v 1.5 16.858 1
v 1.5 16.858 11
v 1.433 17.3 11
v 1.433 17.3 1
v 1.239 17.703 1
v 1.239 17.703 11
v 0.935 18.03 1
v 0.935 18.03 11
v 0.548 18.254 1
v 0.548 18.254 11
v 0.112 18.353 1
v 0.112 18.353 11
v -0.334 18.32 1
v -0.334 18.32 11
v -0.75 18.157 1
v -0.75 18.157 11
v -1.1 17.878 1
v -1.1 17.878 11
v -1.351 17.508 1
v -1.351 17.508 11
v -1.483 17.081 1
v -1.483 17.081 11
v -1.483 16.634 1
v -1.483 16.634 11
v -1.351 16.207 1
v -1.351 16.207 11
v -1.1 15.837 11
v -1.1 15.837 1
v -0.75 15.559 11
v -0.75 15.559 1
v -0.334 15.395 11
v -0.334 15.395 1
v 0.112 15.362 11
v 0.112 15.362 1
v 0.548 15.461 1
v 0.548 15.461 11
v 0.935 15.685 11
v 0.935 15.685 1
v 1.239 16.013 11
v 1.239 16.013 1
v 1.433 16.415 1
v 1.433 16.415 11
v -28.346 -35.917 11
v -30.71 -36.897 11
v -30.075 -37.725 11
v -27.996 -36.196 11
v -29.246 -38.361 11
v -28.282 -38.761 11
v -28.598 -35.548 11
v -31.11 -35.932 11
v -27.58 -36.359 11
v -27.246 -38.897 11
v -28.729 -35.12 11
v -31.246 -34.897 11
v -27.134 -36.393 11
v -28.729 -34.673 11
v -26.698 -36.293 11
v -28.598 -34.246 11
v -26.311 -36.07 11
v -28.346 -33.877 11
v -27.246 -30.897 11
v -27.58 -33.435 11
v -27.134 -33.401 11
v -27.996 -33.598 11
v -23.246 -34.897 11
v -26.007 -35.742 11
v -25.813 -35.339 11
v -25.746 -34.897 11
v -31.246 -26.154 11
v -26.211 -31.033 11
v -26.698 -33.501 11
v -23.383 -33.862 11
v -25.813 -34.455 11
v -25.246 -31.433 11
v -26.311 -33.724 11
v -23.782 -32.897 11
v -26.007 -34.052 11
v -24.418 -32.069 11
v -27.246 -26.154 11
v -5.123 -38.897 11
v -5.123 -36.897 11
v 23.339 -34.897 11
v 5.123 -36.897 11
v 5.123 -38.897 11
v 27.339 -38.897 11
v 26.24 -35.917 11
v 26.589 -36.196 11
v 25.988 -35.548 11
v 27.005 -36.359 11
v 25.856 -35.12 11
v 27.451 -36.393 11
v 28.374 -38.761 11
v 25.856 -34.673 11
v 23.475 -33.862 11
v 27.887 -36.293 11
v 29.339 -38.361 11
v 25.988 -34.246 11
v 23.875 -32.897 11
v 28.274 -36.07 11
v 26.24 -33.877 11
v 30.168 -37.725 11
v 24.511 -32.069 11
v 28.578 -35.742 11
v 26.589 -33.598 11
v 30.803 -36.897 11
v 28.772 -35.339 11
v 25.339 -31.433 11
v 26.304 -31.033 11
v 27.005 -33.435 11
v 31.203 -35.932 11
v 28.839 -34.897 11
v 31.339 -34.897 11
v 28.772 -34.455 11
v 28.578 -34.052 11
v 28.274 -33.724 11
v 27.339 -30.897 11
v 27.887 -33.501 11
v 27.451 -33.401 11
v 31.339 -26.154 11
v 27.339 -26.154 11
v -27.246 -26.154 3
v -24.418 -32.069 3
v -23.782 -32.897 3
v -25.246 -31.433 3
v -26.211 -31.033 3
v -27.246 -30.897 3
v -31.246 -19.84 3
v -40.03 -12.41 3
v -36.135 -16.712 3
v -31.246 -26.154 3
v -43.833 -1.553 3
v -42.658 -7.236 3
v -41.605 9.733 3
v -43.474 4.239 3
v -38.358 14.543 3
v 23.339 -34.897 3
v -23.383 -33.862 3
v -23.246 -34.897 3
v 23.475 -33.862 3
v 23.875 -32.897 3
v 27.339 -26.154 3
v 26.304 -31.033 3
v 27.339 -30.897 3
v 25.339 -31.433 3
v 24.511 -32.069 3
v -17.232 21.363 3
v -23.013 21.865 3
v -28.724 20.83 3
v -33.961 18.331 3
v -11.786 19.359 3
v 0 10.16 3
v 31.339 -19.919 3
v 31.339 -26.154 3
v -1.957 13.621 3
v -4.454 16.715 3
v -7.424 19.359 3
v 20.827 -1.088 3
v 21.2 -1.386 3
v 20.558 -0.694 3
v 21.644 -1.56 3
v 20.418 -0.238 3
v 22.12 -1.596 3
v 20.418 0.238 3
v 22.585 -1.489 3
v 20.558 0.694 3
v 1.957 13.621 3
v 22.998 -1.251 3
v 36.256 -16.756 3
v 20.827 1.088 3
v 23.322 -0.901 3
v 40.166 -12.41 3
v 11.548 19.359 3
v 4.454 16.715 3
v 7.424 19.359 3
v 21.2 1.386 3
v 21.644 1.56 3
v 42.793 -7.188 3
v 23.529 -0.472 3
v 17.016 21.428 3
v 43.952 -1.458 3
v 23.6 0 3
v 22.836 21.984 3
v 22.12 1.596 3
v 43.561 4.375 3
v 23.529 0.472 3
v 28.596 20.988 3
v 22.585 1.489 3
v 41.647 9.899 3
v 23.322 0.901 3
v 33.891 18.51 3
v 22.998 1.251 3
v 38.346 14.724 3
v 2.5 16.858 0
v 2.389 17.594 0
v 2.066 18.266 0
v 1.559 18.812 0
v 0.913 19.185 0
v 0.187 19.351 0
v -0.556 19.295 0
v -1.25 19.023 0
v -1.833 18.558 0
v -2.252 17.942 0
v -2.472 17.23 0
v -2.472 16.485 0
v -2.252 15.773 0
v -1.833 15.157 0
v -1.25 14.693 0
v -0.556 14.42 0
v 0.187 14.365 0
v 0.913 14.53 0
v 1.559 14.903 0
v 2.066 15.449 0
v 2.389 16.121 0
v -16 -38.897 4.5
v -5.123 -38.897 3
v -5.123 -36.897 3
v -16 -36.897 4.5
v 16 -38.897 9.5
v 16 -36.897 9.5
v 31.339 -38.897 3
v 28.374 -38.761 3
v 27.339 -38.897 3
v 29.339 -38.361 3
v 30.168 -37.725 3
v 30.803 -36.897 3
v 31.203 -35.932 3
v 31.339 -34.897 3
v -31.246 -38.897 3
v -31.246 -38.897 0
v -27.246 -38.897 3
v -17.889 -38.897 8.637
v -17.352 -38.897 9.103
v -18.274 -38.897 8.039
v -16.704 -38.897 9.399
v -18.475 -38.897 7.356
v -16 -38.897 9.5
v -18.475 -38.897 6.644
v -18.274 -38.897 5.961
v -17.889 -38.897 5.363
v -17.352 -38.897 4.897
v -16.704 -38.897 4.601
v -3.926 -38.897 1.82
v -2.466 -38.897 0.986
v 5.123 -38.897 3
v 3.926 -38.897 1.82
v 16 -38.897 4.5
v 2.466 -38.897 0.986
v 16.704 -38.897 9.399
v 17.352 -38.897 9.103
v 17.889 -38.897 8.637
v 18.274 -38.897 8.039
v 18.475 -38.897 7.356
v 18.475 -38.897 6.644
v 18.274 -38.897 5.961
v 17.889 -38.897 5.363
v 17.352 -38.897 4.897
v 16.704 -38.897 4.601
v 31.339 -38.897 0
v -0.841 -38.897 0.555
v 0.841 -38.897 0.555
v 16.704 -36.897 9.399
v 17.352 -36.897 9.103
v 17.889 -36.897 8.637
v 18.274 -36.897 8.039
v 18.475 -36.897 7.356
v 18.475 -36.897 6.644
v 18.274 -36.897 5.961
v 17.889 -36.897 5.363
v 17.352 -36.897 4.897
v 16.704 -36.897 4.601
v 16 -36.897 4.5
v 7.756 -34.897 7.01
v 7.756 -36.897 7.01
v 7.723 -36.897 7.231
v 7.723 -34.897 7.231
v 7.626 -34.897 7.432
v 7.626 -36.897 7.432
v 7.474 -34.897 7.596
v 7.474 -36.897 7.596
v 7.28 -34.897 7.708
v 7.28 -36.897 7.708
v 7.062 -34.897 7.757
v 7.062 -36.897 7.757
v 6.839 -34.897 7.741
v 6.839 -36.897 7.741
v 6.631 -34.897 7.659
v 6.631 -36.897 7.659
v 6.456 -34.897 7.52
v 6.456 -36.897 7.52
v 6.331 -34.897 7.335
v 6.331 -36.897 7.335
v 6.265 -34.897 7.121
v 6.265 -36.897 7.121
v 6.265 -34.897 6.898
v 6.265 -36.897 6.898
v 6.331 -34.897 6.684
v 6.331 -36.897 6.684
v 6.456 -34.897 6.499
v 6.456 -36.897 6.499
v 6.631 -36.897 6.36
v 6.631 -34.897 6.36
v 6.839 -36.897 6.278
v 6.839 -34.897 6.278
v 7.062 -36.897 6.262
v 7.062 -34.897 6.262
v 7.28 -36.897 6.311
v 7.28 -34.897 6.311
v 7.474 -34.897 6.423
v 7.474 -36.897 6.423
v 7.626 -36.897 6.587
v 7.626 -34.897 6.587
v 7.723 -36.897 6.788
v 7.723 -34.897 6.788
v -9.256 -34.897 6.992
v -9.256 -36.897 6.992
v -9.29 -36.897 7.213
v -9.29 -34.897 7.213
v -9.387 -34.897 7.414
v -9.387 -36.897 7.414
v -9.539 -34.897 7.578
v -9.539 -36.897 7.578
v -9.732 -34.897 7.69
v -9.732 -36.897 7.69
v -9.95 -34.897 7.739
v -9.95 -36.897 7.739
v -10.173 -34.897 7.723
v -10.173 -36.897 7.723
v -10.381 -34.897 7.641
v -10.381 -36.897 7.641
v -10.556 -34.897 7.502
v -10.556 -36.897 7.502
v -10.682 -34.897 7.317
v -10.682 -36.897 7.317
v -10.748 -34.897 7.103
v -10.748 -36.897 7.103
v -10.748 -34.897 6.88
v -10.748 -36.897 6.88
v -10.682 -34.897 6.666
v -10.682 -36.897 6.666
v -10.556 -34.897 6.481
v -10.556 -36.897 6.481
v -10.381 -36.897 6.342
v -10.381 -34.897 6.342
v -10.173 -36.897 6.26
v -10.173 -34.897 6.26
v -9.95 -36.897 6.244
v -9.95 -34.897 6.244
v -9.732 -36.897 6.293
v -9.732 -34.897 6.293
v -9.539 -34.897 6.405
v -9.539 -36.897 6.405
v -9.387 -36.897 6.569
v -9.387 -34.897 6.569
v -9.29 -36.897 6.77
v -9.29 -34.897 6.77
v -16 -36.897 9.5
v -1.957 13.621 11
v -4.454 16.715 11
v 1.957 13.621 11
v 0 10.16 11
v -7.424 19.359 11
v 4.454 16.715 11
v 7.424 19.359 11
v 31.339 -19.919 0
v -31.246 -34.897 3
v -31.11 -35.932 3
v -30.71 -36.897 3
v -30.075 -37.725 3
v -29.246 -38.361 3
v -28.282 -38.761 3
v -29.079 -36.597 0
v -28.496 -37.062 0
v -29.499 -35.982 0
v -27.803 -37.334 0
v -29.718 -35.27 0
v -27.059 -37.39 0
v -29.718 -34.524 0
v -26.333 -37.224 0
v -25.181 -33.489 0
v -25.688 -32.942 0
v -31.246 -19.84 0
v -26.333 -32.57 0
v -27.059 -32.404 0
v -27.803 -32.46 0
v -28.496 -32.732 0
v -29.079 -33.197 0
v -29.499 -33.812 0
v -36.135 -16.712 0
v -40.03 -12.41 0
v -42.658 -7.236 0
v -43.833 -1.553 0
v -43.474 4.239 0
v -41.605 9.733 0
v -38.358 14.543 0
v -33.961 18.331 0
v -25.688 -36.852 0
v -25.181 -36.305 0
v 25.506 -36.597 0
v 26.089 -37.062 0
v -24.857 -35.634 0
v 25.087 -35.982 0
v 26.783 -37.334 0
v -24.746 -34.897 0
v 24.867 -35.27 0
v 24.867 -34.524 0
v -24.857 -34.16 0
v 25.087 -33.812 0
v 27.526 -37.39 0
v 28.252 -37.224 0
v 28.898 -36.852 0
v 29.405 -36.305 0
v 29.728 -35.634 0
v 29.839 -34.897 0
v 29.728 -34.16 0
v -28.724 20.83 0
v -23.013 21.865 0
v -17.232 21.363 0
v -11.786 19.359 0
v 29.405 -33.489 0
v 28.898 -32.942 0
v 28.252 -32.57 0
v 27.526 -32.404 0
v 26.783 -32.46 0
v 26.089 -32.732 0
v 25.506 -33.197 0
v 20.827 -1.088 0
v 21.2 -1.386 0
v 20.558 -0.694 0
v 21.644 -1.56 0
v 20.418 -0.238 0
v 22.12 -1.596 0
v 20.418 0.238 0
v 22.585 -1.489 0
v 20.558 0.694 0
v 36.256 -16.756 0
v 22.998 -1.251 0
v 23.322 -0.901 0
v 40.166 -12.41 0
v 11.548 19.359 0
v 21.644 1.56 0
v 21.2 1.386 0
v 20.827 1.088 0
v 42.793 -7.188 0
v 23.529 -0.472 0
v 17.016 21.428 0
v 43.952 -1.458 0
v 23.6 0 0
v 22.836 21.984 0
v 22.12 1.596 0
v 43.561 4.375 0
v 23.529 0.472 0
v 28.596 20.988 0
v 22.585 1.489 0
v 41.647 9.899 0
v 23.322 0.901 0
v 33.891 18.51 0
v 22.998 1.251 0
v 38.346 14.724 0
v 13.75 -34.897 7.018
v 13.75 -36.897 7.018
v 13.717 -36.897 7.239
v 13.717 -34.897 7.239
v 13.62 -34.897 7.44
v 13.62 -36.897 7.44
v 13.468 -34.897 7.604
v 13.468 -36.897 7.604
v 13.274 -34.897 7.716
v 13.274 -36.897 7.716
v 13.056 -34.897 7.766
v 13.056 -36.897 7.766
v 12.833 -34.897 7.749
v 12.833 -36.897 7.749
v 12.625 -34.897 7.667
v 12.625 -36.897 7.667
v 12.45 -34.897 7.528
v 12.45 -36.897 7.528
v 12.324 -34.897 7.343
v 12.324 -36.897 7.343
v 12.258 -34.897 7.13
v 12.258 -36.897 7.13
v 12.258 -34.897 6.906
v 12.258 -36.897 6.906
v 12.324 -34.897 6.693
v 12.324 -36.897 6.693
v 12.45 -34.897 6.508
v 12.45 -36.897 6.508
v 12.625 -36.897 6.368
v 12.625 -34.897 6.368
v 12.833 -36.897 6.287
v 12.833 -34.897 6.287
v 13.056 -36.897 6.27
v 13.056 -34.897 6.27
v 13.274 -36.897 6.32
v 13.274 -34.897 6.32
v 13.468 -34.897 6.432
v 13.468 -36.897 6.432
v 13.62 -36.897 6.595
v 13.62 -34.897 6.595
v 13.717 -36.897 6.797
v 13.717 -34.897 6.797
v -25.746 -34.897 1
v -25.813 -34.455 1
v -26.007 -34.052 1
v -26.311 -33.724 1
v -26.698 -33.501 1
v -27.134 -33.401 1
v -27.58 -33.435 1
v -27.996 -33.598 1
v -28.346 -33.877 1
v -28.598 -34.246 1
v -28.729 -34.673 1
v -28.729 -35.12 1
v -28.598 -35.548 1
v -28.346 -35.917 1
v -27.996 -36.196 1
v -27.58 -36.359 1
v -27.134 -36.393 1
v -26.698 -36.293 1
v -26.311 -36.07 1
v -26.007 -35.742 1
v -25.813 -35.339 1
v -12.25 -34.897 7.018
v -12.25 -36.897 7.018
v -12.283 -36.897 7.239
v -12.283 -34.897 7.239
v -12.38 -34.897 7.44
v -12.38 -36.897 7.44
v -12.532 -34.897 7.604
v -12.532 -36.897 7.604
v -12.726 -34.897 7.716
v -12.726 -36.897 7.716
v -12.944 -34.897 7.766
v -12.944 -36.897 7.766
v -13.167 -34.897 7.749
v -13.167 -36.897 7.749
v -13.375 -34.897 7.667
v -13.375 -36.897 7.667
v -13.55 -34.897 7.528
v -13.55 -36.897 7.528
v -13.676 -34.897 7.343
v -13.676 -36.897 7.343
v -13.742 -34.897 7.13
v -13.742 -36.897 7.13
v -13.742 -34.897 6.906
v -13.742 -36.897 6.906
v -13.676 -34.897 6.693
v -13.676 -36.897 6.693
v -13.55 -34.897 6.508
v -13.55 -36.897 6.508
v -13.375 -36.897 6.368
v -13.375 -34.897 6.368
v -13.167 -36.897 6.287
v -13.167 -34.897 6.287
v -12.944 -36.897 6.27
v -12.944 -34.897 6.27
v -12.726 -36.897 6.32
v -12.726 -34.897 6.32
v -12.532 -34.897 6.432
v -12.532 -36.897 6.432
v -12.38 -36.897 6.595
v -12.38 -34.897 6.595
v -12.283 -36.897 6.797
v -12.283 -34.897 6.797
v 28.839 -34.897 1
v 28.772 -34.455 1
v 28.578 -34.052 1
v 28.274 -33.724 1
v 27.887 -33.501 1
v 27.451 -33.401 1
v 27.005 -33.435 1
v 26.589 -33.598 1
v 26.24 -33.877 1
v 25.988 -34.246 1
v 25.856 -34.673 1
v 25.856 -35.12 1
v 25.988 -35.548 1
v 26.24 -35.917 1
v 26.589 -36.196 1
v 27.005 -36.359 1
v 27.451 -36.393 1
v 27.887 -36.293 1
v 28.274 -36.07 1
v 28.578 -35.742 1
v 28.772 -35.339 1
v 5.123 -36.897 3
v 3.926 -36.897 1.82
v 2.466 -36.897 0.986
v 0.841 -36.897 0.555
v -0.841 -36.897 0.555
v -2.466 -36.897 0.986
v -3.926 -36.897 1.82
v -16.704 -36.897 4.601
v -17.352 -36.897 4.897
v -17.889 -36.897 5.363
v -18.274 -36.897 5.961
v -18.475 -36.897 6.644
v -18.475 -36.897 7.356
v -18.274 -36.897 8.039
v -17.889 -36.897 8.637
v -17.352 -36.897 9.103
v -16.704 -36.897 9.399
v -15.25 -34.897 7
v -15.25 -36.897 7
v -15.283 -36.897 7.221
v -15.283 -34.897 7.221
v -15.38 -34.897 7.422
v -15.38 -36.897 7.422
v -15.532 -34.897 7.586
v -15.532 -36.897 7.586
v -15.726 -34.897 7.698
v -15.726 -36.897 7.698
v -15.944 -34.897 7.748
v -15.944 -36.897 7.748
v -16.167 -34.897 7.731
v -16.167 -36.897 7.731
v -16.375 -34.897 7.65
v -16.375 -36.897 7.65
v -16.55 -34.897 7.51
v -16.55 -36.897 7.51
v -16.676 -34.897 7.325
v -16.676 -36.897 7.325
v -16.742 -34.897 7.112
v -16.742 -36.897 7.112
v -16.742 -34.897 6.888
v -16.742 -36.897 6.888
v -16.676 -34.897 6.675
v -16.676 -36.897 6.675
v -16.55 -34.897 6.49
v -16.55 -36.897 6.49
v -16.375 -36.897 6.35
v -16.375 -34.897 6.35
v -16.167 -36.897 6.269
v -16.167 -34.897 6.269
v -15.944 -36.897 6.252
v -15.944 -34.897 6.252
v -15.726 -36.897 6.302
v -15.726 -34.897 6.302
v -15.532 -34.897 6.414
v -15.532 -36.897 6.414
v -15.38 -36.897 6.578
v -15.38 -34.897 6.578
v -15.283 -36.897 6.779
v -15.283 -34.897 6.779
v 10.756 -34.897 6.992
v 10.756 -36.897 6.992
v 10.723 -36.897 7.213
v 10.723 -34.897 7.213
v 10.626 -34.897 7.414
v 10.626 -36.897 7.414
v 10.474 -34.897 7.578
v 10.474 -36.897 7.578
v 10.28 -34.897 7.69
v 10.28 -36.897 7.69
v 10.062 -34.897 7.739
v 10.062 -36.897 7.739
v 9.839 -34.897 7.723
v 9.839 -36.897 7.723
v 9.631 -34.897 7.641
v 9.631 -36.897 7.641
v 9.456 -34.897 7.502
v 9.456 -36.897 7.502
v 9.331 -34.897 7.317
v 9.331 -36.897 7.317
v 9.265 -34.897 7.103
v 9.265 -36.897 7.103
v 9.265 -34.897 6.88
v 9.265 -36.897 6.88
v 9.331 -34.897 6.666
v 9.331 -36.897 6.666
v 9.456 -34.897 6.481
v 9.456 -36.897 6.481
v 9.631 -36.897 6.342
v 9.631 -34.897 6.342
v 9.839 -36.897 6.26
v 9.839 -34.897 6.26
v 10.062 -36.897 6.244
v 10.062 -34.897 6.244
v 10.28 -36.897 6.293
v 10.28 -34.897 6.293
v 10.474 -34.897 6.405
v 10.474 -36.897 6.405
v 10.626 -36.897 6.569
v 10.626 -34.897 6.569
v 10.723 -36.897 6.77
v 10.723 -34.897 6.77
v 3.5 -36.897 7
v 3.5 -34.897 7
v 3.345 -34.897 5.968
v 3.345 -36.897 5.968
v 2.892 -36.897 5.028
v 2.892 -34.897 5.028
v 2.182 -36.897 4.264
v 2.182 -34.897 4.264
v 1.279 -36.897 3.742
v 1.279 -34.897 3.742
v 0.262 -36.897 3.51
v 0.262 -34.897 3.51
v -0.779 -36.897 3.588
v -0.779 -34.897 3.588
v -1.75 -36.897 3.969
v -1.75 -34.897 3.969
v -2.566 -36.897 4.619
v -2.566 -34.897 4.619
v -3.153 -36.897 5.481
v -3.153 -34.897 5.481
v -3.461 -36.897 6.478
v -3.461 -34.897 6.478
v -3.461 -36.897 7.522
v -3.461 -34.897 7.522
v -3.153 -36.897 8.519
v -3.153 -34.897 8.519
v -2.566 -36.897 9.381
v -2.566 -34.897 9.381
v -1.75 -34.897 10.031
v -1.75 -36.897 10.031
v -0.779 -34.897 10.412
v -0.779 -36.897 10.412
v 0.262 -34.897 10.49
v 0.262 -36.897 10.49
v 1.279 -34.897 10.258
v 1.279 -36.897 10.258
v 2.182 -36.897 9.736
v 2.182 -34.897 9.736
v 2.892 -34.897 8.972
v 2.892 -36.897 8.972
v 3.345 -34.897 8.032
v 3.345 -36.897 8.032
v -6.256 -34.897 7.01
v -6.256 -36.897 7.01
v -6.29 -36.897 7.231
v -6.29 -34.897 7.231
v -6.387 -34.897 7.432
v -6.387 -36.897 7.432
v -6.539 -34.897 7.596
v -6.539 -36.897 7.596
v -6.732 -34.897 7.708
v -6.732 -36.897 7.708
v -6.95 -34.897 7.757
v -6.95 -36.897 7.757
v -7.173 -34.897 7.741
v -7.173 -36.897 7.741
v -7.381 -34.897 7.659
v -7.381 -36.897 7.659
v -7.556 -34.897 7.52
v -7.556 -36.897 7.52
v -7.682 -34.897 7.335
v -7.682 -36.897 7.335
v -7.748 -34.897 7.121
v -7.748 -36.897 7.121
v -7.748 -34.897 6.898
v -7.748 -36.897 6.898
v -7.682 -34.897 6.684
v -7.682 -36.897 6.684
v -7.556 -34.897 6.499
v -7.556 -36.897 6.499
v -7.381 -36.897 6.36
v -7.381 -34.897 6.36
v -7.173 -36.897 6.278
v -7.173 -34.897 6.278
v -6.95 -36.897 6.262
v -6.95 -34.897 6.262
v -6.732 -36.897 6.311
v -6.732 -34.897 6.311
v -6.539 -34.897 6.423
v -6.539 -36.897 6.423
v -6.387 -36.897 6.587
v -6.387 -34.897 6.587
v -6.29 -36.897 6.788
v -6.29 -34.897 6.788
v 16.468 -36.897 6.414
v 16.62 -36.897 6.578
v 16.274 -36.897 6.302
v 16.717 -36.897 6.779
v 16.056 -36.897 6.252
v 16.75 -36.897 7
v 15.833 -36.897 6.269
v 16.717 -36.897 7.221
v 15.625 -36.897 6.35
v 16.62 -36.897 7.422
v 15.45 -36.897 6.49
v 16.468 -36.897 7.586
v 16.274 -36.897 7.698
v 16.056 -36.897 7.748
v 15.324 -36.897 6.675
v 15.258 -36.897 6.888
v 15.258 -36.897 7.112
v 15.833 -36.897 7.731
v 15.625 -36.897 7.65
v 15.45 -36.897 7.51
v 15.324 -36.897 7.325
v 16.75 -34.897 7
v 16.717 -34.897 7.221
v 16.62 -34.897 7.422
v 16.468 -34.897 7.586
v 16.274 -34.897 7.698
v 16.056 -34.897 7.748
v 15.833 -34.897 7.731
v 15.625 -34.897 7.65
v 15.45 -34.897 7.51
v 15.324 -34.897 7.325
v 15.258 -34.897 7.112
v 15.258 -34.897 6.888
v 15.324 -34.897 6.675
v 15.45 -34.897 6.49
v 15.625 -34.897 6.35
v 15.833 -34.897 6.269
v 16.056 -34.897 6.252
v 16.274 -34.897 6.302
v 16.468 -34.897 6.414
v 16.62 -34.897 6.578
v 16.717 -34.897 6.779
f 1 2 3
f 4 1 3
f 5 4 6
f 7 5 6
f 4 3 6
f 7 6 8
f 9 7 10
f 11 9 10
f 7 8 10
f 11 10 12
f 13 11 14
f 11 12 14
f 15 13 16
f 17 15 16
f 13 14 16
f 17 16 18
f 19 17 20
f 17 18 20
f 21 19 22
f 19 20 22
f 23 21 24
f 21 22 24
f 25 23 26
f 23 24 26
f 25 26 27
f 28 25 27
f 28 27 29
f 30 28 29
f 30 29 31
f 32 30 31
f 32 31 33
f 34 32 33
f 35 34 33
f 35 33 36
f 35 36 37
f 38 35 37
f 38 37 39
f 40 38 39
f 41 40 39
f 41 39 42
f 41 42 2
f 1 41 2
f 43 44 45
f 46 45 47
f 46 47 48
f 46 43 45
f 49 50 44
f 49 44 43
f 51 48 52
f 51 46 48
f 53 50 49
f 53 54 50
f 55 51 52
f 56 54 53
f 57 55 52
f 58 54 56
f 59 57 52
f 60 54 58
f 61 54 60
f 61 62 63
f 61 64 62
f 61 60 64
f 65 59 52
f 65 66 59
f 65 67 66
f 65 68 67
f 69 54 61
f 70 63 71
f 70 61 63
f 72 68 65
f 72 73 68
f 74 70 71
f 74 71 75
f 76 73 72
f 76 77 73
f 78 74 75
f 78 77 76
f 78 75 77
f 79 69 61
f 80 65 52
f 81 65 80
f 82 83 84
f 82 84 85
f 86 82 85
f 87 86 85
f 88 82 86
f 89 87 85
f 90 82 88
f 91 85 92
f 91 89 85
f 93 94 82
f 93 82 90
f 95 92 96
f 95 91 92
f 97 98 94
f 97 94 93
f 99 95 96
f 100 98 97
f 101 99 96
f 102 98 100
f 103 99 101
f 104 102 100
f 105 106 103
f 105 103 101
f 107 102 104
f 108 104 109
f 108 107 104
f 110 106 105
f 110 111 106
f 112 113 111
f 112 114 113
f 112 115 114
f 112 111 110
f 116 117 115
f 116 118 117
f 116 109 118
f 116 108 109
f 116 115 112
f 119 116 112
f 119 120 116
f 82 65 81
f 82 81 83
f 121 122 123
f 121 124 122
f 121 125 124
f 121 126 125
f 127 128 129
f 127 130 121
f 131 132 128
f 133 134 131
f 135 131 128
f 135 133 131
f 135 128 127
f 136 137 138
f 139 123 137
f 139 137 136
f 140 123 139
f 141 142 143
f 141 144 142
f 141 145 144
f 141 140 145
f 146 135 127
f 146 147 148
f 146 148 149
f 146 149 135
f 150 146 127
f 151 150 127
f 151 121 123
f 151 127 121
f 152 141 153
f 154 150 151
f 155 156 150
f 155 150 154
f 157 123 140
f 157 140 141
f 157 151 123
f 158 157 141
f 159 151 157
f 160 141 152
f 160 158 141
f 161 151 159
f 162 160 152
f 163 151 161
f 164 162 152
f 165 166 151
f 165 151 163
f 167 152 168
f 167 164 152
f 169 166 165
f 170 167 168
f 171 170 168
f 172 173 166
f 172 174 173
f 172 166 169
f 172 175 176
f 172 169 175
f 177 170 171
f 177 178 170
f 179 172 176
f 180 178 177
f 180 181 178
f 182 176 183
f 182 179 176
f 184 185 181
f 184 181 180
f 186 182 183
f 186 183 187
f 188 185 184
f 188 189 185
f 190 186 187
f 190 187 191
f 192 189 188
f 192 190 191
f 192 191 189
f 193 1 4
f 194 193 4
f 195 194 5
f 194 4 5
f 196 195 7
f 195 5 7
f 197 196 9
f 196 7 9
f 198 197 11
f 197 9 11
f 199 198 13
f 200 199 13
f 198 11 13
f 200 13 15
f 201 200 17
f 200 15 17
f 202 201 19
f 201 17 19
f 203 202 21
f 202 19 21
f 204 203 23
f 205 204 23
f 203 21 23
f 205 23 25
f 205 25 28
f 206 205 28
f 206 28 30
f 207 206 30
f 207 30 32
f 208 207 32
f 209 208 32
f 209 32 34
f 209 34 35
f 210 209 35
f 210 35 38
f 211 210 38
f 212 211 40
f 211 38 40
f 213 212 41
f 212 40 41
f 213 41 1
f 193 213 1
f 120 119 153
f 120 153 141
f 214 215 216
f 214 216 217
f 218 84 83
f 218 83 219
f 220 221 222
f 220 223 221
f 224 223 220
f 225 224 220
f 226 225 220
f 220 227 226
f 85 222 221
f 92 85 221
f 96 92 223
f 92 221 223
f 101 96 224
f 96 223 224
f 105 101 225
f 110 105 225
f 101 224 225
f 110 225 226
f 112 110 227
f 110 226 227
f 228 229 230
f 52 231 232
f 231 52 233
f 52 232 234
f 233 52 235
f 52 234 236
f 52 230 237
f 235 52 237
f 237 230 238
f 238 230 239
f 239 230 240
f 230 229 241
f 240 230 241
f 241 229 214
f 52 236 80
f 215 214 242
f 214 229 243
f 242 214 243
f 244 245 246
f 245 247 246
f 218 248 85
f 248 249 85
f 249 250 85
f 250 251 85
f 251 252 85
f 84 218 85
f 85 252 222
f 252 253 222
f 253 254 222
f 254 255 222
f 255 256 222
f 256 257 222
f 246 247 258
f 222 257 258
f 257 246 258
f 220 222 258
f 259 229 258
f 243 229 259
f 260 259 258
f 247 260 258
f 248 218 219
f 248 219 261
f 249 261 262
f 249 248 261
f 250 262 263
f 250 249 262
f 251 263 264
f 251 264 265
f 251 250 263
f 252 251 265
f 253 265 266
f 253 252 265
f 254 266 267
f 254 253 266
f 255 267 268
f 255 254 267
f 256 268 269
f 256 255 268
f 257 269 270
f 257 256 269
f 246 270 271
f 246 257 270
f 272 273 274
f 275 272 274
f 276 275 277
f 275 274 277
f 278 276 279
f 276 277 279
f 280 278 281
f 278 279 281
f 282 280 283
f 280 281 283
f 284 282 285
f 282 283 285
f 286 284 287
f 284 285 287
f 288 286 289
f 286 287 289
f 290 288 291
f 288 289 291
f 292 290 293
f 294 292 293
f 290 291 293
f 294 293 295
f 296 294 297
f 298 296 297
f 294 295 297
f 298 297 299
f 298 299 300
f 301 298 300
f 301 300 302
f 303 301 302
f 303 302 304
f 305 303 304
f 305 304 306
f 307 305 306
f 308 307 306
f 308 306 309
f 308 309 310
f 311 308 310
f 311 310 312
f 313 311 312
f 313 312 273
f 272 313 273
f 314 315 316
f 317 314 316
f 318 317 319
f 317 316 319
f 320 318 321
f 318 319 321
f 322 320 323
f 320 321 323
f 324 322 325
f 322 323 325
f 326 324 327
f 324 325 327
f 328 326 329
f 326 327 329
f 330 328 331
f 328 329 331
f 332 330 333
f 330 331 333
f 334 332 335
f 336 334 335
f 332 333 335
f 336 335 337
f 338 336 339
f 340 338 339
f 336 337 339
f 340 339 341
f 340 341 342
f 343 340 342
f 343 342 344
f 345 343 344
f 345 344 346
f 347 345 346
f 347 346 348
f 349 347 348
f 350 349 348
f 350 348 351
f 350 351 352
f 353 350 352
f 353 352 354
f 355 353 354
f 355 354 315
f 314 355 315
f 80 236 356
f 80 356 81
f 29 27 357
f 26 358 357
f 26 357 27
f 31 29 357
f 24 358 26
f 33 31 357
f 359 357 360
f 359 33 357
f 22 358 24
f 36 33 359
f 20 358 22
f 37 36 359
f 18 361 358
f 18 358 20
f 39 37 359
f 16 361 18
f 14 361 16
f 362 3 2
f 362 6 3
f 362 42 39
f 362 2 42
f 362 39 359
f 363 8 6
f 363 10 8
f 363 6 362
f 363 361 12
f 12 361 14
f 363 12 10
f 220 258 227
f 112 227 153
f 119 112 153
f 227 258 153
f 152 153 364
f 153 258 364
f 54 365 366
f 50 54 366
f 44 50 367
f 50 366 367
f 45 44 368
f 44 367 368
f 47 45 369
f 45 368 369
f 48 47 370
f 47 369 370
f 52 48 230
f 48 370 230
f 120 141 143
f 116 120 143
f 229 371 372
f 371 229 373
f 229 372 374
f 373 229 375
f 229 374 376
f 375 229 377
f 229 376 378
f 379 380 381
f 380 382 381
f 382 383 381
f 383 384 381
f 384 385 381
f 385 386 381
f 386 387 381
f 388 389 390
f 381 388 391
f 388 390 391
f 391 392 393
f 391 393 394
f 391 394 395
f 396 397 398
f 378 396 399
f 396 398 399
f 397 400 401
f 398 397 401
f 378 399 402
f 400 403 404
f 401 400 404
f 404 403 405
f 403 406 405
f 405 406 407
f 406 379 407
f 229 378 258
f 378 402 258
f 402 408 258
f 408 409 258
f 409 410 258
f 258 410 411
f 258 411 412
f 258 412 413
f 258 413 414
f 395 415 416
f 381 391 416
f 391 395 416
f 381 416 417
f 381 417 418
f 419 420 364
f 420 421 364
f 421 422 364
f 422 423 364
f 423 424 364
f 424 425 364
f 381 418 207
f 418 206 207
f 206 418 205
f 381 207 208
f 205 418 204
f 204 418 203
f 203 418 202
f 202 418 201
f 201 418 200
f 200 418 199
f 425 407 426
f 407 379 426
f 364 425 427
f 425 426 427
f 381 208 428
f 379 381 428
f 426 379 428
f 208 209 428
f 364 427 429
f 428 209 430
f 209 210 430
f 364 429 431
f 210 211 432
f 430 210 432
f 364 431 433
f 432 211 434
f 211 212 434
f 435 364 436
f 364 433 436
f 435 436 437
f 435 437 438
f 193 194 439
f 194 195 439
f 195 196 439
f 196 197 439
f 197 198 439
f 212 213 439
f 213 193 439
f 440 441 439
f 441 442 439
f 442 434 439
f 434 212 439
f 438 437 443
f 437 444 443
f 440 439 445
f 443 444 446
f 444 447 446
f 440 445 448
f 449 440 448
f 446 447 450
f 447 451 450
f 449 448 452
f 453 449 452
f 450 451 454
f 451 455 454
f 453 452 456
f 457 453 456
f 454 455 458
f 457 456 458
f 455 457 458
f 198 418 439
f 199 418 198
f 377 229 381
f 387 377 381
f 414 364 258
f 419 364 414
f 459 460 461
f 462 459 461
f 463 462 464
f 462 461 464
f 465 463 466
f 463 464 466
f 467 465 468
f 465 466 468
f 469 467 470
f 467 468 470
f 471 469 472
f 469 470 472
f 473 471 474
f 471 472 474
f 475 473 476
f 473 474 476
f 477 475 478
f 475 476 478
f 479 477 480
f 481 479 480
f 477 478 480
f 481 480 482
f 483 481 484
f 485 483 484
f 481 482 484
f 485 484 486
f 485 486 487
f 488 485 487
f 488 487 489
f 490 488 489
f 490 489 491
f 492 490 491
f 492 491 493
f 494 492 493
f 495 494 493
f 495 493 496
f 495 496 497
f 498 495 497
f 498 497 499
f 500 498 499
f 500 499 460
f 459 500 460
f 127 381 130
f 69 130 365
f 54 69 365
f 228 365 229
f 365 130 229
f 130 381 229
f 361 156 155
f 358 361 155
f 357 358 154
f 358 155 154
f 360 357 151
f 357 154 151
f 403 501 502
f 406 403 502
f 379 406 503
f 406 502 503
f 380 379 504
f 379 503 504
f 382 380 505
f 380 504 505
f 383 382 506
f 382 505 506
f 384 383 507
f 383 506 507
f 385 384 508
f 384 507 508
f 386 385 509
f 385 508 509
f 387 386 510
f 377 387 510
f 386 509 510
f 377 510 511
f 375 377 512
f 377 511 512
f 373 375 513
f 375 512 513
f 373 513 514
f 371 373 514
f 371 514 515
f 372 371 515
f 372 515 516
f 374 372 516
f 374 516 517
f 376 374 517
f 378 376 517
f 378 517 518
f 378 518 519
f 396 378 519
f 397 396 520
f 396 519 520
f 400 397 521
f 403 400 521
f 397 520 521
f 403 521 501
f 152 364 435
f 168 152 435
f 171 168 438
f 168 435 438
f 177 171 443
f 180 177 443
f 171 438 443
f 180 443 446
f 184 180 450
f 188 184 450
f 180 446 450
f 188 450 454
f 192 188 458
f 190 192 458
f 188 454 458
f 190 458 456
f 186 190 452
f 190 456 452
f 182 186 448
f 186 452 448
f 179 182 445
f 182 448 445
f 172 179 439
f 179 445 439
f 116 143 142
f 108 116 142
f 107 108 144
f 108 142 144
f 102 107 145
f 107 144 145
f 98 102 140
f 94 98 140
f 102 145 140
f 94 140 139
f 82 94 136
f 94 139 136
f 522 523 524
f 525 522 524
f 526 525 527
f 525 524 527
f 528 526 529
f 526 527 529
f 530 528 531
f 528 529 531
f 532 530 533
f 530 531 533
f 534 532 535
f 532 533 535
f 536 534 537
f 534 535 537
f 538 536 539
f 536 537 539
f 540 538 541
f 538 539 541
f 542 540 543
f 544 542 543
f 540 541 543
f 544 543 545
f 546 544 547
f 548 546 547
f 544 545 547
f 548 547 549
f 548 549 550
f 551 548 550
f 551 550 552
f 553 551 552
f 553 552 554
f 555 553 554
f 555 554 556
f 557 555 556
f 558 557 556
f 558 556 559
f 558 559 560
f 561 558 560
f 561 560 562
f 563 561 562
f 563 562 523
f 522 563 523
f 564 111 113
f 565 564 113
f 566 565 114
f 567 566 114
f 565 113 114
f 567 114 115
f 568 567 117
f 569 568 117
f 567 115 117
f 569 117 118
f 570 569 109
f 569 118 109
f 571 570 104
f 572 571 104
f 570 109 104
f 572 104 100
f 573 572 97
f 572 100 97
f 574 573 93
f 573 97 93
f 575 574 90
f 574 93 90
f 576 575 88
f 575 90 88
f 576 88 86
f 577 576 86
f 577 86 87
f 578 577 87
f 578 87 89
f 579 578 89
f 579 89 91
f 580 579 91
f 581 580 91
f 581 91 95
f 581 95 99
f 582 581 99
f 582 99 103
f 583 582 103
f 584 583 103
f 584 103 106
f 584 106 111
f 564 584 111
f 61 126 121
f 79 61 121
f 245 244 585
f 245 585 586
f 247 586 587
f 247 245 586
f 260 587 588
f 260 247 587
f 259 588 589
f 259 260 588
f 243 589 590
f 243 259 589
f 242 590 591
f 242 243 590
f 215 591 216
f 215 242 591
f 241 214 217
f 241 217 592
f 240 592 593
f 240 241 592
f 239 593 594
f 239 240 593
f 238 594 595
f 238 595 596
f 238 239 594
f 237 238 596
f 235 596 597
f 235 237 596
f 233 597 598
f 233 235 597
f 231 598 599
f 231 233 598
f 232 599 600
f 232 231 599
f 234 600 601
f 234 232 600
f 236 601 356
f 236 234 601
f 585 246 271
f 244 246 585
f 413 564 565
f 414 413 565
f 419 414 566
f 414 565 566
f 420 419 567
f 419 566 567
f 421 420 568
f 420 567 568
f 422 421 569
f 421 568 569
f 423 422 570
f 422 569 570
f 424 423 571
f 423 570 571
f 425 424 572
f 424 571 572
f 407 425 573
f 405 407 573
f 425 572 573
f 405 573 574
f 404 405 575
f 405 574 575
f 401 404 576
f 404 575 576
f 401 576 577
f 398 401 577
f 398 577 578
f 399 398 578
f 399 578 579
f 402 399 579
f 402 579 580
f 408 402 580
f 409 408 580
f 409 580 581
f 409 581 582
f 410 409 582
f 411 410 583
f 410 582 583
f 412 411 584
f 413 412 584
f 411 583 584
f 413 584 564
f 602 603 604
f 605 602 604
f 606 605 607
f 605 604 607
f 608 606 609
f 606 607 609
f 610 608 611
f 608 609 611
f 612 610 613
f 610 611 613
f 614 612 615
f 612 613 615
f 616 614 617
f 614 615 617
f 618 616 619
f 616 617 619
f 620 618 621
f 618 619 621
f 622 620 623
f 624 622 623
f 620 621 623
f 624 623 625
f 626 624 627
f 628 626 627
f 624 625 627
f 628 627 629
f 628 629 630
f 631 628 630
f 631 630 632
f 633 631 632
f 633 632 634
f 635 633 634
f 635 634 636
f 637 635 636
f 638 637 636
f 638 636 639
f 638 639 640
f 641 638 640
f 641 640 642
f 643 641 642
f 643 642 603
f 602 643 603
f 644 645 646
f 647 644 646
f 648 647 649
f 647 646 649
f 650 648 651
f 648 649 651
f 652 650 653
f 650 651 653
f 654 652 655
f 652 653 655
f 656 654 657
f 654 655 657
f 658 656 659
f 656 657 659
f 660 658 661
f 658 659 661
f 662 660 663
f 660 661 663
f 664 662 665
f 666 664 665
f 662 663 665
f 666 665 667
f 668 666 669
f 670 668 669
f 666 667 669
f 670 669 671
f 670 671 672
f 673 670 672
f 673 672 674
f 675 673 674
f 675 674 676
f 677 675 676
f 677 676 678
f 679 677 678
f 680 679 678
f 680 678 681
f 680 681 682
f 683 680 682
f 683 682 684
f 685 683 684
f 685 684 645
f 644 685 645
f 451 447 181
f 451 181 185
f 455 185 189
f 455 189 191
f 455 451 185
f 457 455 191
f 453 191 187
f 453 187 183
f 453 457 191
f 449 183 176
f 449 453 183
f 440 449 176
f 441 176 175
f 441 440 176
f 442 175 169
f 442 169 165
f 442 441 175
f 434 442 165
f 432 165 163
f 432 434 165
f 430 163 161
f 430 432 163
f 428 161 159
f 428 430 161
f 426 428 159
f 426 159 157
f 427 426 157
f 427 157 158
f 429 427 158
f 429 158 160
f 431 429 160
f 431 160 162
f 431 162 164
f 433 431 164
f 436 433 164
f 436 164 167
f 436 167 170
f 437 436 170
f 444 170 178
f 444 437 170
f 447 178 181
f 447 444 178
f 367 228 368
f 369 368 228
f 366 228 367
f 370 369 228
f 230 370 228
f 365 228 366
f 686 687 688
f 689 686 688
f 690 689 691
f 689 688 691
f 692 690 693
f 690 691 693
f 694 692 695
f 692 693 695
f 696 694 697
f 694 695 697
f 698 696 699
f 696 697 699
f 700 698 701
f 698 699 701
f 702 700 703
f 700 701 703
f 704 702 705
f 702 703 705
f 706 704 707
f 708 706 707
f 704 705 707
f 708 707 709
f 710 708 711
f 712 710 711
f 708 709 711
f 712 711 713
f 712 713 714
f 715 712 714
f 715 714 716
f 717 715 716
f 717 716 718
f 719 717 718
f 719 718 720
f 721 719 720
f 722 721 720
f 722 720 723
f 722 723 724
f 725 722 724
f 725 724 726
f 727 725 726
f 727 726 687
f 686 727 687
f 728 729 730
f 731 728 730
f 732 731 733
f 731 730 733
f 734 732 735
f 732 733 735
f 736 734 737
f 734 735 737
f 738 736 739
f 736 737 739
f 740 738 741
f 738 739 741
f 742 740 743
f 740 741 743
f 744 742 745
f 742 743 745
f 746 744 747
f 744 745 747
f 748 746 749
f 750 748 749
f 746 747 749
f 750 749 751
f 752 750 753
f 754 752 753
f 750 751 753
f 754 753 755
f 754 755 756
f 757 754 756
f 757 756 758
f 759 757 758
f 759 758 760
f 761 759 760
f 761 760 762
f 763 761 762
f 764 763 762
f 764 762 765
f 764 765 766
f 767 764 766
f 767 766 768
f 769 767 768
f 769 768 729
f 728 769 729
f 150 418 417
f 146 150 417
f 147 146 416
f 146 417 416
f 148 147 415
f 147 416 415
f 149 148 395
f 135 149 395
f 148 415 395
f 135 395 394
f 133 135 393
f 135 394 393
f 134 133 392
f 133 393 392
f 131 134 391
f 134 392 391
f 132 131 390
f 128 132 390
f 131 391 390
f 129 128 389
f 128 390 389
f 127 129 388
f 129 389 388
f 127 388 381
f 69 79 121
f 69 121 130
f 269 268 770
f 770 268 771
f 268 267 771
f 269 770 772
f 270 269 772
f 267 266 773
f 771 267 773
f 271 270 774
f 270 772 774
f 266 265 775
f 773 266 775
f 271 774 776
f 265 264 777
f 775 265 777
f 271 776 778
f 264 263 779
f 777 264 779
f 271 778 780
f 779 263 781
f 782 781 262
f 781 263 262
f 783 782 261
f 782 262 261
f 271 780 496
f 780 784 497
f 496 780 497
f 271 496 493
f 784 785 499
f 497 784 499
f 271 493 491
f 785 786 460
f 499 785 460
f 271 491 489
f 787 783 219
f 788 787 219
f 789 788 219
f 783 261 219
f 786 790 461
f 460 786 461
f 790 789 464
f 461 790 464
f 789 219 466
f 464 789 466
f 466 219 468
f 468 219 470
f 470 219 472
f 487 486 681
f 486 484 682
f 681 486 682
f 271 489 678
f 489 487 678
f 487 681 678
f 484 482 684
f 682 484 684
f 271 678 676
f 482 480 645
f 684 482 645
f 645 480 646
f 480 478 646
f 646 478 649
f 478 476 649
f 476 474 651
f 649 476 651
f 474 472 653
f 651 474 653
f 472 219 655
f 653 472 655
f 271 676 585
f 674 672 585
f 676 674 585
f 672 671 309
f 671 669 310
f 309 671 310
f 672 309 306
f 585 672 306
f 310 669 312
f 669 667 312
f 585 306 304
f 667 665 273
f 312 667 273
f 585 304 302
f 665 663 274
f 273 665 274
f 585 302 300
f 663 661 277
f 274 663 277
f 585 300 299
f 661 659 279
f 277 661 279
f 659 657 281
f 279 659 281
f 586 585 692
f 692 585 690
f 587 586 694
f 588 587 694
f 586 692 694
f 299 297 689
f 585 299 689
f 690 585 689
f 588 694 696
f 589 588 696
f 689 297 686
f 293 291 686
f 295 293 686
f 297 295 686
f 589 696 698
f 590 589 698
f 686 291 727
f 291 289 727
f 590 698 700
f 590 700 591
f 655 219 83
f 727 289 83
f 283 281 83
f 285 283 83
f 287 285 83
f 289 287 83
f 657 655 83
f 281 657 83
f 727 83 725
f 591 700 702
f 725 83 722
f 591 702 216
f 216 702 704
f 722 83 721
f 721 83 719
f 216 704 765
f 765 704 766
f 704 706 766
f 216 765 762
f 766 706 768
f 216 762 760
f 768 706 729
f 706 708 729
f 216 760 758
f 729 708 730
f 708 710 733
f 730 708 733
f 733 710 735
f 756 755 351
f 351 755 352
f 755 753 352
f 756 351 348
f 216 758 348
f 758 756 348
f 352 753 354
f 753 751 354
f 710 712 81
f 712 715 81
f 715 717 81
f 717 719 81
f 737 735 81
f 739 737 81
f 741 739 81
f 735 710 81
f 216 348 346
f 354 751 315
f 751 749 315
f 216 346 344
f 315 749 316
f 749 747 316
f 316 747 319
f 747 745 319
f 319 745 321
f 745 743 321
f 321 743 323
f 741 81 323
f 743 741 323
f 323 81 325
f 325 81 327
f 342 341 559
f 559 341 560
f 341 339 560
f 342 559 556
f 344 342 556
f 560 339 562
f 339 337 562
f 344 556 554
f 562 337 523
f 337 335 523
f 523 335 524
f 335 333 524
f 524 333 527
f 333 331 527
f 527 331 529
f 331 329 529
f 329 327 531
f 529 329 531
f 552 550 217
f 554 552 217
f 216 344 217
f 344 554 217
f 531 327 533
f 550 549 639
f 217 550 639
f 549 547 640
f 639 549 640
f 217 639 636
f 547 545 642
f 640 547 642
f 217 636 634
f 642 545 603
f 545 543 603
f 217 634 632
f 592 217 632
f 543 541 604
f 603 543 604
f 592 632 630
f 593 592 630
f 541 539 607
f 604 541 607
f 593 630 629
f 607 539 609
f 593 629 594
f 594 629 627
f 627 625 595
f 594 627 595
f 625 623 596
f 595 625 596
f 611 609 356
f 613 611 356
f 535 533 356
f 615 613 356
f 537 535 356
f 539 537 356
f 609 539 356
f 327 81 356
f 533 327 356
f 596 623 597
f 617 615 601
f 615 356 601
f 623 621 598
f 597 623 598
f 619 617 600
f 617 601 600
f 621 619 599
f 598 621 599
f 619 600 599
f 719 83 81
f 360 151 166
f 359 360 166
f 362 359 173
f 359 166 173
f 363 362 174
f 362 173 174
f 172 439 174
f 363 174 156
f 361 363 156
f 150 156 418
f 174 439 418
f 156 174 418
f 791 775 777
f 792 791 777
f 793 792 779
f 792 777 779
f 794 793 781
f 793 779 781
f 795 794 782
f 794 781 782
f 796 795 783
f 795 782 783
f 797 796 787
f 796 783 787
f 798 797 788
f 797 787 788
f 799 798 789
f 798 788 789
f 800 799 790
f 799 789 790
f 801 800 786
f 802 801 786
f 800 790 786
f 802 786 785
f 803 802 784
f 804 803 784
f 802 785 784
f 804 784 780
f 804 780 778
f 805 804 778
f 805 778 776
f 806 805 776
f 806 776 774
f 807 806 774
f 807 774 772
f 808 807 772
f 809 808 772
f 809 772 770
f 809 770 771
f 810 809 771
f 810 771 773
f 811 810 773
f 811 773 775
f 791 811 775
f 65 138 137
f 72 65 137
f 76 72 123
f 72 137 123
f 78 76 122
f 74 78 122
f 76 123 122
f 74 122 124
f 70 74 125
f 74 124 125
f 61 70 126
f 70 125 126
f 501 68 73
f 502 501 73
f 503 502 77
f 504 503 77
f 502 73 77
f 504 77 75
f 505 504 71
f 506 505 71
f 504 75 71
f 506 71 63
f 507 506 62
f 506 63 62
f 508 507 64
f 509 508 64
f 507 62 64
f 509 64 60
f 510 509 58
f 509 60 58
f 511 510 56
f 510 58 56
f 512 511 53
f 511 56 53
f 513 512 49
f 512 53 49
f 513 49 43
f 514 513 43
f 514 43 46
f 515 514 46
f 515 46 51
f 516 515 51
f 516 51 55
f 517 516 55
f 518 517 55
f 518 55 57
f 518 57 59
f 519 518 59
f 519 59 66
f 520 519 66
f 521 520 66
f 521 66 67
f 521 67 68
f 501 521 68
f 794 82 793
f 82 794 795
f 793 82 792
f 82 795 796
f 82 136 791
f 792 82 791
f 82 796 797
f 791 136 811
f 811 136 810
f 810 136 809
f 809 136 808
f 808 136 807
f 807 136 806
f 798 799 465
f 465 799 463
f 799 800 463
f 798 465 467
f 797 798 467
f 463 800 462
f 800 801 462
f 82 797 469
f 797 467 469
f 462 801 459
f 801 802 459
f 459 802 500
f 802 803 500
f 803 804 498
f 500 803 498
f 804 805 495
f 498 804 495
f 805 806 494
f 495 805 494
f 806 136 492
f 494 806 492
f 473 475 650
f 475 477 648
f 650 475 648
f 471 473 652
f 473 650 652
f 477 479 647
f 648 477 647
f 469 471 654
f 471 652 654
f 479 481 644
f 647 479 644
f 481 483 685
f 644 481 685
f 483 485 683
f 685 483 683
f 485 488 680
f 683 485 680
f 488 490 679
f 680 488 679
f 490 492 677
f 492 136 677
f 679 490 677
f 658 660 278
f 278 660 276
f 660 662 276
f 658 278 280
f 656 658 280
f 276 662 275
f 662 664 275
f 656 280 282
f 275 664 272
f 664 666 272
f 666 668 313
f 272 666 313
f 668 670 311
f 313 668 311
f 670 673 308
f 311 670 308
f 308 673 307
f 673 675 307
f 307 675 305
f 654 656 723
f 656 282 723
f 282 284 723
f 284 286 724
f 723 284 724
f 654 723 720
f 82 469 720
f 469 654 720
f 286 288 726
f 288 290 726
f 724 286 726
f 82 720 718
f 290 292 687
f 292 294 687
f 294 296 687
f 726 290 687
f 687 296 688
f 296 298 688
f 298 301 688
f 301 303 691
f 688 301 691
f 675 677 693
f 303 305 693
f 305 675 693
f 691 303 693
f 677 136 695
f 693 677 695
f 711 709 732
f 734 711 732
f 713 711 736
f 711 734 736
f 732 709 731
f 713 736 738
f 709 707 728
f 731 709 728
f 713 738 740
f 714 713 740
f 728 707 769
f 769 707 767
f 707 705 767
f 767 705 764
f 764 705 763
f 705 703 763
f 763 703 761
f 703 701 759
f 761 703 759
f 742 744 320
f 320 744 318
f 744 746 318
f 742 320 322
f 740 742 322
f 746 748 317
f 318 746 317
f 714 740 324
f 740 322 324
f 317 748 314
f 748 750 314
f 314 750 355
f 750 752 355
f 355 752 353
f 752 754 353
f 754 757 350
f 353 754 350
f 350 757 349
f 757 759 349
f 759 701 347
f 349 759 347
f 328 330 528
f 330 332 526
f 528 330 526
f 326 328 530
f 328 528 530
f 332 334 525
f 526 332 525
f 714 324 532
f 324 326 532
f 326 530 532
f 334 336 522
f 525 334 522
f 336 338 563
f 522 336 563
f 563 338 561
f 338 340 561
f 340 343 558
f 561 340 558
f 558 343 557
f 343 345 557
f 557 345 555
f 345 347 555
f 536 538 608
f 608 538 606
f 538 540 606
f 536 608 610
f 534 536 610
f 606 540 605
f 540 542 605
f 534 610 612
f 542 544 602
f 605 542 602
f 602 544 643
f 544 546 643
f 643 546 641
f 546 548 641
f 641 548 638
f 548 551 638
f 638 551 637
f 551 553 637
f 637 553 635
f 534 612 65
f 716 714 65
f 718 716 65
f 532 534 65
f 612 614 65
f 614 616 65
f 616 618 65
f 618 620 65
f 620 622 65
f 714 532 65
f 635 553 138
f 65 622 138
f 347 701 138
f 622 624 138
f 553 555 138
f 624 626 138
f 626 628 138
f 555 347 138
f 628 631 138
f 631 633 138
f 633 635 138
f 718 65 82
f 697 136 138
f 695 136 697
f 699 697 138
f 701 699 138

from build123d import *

# Parameters (mm, degrees)
CROQUIS1_R                         = 1.6
BASE_TAPA_DEPTH                    = 3
CROQUIS2_R                         = 1.5
SOPORTES_TAPA_DEPTH                = 8
CROQUIS3_R                         = 3.5
CAJA_HORN_SERVO_EXTERIOR_1_DEPTH   = 4
CROQUIS4_R                         = 0.75
CAJA_HORN_SERVO_EXTERIOR_2_DEPTH   = 2
CROQUIS5_R                         = 0.75
TALADROS_HORN_SERVO_EXTERIOR_DEPTH = 4
CROQUIS6_R                         = 1.5
TALADROS_TAPA_DEPTH                = 11
CROQUIS7_R                         = 1.6
RECTIFICAR_TALADRO_DEPTH           = 3
CHAFL_N_TALADROS_TAPA_SIZE         = 1


with BuildPart() as part:
    # Croquis1 → Base Tapa (new body)
    with BuildSketch(Plane.XY):
        with BuildLine():
            Line((11.548443784, 19.3588474), (-11.785521088, 19.3588474))
            ThreePointArc((-11.785521088, 19.3588474), (-41.605177571, 9.733322379), (-31.246229762, -19.839551086))
            Line((-31.246229762, -19.839551086), (-31.246229762, -38.896936565))
            Line((-31.246229762, -38.896936565), (31.339101257, -38.896936565))
            Line((31.339101257, -38.896936565), (31.339101257, -19.919367151))
            ThreePointArc((31.339101257, -19.919367151), (41.646982557, 9.899296763), (11.548443784, 19.3588474))
        make_face()
        with Locations((-22, 0)):
            Circle(CROQUIS1_R, mode=Mode.SUBTRACT)
        with Locations((22, 0)):
            Circle(CROQUIS1_R, mode=Mode.SUBTRACT)
    extrude(amount=BASE_TAPA_DEPTH)

    # Croquis2 → Soportes tapa (add)
    with BuildSketch(Plane.XY.offset(3)):
        with BuildLine():
            ThreePointArc((-31.246229762, -34.896936565), (-30.074656886, -37.725363689), (-27.246229762, -38.896936565))
            Line((-27.246229762, -38.896936565), (27.339101257, -38.896936565))
            ThreePointArc((27.339101257, -38.896936565), (30.167528382, -37.725363689), (31.339101257, -34.896936565))
            Line((31.339101257, -34.896936565), (31.339101257, -26.154350822))
            Line((31.339101257, -26.154350822), (27.339101257, -26.154350822))
            Line((27.339101257, -26.154350822), (27.339101257, -30.896936565))
            ThreePointArc((27.339101257, -30.896936565), (24.510674133, -32.06850944), (23.339101257, -34.896936565))
            Line((23.339101257, -34.896936565), (-23.246229762, -34.896936565))
            ThreePointArc((-23.246229762, -34.896936565), (-24.417802637, -32.06850944), (-27.246229762, -30.896936565))
            Line((-27.246229762, -30.896936565), (-27.246229762, -26.154350822))
            Line((-27.246229762, -26.154350822), (-31.246229762, -26.154350822))
            Line((-31.246229762, -26.154350822), (-31.246229762, -34.896936565))
        make_face()
        with Locations((-27.246229762, -34.896936565)):
            Circle(CROQUIS2_R, mode=Mode.SUBTRACT)
        with Locations((27.339101257, -34.896936565)):
            Circle(CROQUIS2_R, mode=Mode.SUBTRACT)
        with BuildLine():
            Line((7.423794942, 19.3588474), (-7.423794942, 19.3588474))
            ThreePointArc((-7.423794942, 19.3588474), (-3.142422422, 15.219148939), (0, 10.160252288))
            ThreePointArc((0, 10.160252288), (3.142422422, 15.219148939), (7.423794942, 19.3588474))
        make_face()
        with Locations((0, 16.857587951)):
            Circle(CROQUIS2_R, mode=Mode.SUBTRACT)
    extrude(amount=SOPORTES_TAPA_DEPTH)

    # Croquis3 → Caja Horn servo exterior 1 (cut)
    with BuildSketch(Plane(origin=(0, -34.896936565, 0), x_dir=(1, 0, 0), z_dir=(0, 1, 0))):
        with Locations((0, -7)):
            Circle(CROQUIS3_R)
    extrude(amount=-CAJA_HORN_SERVO_EXTERIOR_1_DEPTH, mode=Mode.SUBTRACT)

    # Croquis4 → Caja Horn servo exterior 2 (cut)
    with BuildSketch(Plane.XZ.offset(38.896936565)):
        with BuildLine():
            Line((-16, 9.5), (-5.123475383, 11))
            ThreePointArc((-5.123475383, 11), (0, 13.5), (5.123475383, 11))
            Line((5.123475383, 11), (16, 9.5))
            ThreePointArc((16, 9.5), (18.5, 7), (16, 4.5))
            Line((16, 4.5), (5.123475383, 3))
            ThreePointArc((5.123475383, 3), (0, 0.5), (-5.123475383, 3))
            Line((-5.123475383, 3), (-16, 4.5))
            ThreePointArc((-16, 4.5), (-18.5, 7), (-16, 9.5))
        make_face()
        with Locations((-16, 7)):
            Circle(CROQUIS4_R, mode=Mode.SUBTRACT)
        with Locations((-13, 7.017965487)):
            Circle(CROQUIS4_R, mode=Mode.SUBTRACT)
        with Locations((-10.006253635, 6.991538598)):
            Circle(CROQUIS4_R, mode=Mode.SUBTRACT)
        with Locations((-7.006253635, 7.009504085)):
            Circle(CROQUIS4_R, mode=Mode.SUBTRACT)
        with Locations((7.006253635, 7.009504085)):
            Circle(CROQUIS4_R, mode=Mode.SUBTRACT)
        with Locations((10.006253635, 6.991538598)):
            Circle(CROQUIS4_R, mode=Mode.SUBTRACT)
        with Locations((13, 7.017965487)):
            Circle(CROQUIS4_R, mode=Mode.SUBTRACT)
        with Locations((16, 7)):
            Circle(CROQUIS4_R, mode=Mode.SUBTRACT)
    extrude(amount=-CAJA_HORN_SERVO_EXTERIOR_2_DEPTH, mode=Mode.SUBTRACT)

    # Croquis5 → Taladros Horn servo exterior (cut)
    with BuildSketch(Plane.XZ.offset(38.896936565)):
        with Locations((-16, 7)):
            Circle(CROQUIS5_R)
        with Locations((-13, 7.017965487)):
            Circle(CROQUIS5_R)
        with Locations((-10.006253635, 6.991538598)):
            Circle(CROQUIS5_R)
        with Locations((-7.006253635, 7.009504085)):
            Circle(CROQUIS5_R)
        with Locations((7.006253635, 7.009504085)):
            Circle(CROQUIS5_R)
        with Locations((10.006253635, 6.991538598)):
            Circle(CROQUIS5_R)
        with Locations((13, 7.017965487)):
            Circle(CROQUIS5_R)
        with Locations((16, 7)):
            Circle(CROQUIS5_R)
    extrude(amount=-TALADROS_HORN_SERVO_EXTERIOR_DEPTH, mode=Mode.SUBTRACT)

    # Croquis6 → Taladros Tapa (cut)
    with BuildSketch(Plane.XY.offset(11)):
        with Locations((0, 16.857587951)):
            Circle(CROQUIS6_R)
        with Locations((27.339101257, -34.896936565)):
            Circle(CROQUIS6_R)
        with Locations((-27.246229762, -34.896936565)):
            Circle(CROQUIS6_R)
    extrude(amount=-TALADROS_TAPA_DEPTH, mode=Mode.SUBTRACT)

    # Croquis7 → Rectificar taladro (add)
    with BuildSketch(Plane.XY.offset(3)):
        with Locations((-22, 0)):
            Circle(CROQUIS7_R)
    extrude(amount=-RECTIFICAR_TALADRO_DEPTH)

    # Chaflán taladros tapa
    chafl_n_taladros_tapa_edges = [part.edges().sort_by_distance(p)[0] for p in [
        (-1.5, 16.857587951, 0),
        (25.839101257, -34.896936565, 0),
        (-28.746229762, -34.896936565, 0),
    ]]
    chamfer(chafl_n_taladros_tapa_edges, length=CHAFL_N_TALADROS_TAPA_SIZE)


solid = part.part
